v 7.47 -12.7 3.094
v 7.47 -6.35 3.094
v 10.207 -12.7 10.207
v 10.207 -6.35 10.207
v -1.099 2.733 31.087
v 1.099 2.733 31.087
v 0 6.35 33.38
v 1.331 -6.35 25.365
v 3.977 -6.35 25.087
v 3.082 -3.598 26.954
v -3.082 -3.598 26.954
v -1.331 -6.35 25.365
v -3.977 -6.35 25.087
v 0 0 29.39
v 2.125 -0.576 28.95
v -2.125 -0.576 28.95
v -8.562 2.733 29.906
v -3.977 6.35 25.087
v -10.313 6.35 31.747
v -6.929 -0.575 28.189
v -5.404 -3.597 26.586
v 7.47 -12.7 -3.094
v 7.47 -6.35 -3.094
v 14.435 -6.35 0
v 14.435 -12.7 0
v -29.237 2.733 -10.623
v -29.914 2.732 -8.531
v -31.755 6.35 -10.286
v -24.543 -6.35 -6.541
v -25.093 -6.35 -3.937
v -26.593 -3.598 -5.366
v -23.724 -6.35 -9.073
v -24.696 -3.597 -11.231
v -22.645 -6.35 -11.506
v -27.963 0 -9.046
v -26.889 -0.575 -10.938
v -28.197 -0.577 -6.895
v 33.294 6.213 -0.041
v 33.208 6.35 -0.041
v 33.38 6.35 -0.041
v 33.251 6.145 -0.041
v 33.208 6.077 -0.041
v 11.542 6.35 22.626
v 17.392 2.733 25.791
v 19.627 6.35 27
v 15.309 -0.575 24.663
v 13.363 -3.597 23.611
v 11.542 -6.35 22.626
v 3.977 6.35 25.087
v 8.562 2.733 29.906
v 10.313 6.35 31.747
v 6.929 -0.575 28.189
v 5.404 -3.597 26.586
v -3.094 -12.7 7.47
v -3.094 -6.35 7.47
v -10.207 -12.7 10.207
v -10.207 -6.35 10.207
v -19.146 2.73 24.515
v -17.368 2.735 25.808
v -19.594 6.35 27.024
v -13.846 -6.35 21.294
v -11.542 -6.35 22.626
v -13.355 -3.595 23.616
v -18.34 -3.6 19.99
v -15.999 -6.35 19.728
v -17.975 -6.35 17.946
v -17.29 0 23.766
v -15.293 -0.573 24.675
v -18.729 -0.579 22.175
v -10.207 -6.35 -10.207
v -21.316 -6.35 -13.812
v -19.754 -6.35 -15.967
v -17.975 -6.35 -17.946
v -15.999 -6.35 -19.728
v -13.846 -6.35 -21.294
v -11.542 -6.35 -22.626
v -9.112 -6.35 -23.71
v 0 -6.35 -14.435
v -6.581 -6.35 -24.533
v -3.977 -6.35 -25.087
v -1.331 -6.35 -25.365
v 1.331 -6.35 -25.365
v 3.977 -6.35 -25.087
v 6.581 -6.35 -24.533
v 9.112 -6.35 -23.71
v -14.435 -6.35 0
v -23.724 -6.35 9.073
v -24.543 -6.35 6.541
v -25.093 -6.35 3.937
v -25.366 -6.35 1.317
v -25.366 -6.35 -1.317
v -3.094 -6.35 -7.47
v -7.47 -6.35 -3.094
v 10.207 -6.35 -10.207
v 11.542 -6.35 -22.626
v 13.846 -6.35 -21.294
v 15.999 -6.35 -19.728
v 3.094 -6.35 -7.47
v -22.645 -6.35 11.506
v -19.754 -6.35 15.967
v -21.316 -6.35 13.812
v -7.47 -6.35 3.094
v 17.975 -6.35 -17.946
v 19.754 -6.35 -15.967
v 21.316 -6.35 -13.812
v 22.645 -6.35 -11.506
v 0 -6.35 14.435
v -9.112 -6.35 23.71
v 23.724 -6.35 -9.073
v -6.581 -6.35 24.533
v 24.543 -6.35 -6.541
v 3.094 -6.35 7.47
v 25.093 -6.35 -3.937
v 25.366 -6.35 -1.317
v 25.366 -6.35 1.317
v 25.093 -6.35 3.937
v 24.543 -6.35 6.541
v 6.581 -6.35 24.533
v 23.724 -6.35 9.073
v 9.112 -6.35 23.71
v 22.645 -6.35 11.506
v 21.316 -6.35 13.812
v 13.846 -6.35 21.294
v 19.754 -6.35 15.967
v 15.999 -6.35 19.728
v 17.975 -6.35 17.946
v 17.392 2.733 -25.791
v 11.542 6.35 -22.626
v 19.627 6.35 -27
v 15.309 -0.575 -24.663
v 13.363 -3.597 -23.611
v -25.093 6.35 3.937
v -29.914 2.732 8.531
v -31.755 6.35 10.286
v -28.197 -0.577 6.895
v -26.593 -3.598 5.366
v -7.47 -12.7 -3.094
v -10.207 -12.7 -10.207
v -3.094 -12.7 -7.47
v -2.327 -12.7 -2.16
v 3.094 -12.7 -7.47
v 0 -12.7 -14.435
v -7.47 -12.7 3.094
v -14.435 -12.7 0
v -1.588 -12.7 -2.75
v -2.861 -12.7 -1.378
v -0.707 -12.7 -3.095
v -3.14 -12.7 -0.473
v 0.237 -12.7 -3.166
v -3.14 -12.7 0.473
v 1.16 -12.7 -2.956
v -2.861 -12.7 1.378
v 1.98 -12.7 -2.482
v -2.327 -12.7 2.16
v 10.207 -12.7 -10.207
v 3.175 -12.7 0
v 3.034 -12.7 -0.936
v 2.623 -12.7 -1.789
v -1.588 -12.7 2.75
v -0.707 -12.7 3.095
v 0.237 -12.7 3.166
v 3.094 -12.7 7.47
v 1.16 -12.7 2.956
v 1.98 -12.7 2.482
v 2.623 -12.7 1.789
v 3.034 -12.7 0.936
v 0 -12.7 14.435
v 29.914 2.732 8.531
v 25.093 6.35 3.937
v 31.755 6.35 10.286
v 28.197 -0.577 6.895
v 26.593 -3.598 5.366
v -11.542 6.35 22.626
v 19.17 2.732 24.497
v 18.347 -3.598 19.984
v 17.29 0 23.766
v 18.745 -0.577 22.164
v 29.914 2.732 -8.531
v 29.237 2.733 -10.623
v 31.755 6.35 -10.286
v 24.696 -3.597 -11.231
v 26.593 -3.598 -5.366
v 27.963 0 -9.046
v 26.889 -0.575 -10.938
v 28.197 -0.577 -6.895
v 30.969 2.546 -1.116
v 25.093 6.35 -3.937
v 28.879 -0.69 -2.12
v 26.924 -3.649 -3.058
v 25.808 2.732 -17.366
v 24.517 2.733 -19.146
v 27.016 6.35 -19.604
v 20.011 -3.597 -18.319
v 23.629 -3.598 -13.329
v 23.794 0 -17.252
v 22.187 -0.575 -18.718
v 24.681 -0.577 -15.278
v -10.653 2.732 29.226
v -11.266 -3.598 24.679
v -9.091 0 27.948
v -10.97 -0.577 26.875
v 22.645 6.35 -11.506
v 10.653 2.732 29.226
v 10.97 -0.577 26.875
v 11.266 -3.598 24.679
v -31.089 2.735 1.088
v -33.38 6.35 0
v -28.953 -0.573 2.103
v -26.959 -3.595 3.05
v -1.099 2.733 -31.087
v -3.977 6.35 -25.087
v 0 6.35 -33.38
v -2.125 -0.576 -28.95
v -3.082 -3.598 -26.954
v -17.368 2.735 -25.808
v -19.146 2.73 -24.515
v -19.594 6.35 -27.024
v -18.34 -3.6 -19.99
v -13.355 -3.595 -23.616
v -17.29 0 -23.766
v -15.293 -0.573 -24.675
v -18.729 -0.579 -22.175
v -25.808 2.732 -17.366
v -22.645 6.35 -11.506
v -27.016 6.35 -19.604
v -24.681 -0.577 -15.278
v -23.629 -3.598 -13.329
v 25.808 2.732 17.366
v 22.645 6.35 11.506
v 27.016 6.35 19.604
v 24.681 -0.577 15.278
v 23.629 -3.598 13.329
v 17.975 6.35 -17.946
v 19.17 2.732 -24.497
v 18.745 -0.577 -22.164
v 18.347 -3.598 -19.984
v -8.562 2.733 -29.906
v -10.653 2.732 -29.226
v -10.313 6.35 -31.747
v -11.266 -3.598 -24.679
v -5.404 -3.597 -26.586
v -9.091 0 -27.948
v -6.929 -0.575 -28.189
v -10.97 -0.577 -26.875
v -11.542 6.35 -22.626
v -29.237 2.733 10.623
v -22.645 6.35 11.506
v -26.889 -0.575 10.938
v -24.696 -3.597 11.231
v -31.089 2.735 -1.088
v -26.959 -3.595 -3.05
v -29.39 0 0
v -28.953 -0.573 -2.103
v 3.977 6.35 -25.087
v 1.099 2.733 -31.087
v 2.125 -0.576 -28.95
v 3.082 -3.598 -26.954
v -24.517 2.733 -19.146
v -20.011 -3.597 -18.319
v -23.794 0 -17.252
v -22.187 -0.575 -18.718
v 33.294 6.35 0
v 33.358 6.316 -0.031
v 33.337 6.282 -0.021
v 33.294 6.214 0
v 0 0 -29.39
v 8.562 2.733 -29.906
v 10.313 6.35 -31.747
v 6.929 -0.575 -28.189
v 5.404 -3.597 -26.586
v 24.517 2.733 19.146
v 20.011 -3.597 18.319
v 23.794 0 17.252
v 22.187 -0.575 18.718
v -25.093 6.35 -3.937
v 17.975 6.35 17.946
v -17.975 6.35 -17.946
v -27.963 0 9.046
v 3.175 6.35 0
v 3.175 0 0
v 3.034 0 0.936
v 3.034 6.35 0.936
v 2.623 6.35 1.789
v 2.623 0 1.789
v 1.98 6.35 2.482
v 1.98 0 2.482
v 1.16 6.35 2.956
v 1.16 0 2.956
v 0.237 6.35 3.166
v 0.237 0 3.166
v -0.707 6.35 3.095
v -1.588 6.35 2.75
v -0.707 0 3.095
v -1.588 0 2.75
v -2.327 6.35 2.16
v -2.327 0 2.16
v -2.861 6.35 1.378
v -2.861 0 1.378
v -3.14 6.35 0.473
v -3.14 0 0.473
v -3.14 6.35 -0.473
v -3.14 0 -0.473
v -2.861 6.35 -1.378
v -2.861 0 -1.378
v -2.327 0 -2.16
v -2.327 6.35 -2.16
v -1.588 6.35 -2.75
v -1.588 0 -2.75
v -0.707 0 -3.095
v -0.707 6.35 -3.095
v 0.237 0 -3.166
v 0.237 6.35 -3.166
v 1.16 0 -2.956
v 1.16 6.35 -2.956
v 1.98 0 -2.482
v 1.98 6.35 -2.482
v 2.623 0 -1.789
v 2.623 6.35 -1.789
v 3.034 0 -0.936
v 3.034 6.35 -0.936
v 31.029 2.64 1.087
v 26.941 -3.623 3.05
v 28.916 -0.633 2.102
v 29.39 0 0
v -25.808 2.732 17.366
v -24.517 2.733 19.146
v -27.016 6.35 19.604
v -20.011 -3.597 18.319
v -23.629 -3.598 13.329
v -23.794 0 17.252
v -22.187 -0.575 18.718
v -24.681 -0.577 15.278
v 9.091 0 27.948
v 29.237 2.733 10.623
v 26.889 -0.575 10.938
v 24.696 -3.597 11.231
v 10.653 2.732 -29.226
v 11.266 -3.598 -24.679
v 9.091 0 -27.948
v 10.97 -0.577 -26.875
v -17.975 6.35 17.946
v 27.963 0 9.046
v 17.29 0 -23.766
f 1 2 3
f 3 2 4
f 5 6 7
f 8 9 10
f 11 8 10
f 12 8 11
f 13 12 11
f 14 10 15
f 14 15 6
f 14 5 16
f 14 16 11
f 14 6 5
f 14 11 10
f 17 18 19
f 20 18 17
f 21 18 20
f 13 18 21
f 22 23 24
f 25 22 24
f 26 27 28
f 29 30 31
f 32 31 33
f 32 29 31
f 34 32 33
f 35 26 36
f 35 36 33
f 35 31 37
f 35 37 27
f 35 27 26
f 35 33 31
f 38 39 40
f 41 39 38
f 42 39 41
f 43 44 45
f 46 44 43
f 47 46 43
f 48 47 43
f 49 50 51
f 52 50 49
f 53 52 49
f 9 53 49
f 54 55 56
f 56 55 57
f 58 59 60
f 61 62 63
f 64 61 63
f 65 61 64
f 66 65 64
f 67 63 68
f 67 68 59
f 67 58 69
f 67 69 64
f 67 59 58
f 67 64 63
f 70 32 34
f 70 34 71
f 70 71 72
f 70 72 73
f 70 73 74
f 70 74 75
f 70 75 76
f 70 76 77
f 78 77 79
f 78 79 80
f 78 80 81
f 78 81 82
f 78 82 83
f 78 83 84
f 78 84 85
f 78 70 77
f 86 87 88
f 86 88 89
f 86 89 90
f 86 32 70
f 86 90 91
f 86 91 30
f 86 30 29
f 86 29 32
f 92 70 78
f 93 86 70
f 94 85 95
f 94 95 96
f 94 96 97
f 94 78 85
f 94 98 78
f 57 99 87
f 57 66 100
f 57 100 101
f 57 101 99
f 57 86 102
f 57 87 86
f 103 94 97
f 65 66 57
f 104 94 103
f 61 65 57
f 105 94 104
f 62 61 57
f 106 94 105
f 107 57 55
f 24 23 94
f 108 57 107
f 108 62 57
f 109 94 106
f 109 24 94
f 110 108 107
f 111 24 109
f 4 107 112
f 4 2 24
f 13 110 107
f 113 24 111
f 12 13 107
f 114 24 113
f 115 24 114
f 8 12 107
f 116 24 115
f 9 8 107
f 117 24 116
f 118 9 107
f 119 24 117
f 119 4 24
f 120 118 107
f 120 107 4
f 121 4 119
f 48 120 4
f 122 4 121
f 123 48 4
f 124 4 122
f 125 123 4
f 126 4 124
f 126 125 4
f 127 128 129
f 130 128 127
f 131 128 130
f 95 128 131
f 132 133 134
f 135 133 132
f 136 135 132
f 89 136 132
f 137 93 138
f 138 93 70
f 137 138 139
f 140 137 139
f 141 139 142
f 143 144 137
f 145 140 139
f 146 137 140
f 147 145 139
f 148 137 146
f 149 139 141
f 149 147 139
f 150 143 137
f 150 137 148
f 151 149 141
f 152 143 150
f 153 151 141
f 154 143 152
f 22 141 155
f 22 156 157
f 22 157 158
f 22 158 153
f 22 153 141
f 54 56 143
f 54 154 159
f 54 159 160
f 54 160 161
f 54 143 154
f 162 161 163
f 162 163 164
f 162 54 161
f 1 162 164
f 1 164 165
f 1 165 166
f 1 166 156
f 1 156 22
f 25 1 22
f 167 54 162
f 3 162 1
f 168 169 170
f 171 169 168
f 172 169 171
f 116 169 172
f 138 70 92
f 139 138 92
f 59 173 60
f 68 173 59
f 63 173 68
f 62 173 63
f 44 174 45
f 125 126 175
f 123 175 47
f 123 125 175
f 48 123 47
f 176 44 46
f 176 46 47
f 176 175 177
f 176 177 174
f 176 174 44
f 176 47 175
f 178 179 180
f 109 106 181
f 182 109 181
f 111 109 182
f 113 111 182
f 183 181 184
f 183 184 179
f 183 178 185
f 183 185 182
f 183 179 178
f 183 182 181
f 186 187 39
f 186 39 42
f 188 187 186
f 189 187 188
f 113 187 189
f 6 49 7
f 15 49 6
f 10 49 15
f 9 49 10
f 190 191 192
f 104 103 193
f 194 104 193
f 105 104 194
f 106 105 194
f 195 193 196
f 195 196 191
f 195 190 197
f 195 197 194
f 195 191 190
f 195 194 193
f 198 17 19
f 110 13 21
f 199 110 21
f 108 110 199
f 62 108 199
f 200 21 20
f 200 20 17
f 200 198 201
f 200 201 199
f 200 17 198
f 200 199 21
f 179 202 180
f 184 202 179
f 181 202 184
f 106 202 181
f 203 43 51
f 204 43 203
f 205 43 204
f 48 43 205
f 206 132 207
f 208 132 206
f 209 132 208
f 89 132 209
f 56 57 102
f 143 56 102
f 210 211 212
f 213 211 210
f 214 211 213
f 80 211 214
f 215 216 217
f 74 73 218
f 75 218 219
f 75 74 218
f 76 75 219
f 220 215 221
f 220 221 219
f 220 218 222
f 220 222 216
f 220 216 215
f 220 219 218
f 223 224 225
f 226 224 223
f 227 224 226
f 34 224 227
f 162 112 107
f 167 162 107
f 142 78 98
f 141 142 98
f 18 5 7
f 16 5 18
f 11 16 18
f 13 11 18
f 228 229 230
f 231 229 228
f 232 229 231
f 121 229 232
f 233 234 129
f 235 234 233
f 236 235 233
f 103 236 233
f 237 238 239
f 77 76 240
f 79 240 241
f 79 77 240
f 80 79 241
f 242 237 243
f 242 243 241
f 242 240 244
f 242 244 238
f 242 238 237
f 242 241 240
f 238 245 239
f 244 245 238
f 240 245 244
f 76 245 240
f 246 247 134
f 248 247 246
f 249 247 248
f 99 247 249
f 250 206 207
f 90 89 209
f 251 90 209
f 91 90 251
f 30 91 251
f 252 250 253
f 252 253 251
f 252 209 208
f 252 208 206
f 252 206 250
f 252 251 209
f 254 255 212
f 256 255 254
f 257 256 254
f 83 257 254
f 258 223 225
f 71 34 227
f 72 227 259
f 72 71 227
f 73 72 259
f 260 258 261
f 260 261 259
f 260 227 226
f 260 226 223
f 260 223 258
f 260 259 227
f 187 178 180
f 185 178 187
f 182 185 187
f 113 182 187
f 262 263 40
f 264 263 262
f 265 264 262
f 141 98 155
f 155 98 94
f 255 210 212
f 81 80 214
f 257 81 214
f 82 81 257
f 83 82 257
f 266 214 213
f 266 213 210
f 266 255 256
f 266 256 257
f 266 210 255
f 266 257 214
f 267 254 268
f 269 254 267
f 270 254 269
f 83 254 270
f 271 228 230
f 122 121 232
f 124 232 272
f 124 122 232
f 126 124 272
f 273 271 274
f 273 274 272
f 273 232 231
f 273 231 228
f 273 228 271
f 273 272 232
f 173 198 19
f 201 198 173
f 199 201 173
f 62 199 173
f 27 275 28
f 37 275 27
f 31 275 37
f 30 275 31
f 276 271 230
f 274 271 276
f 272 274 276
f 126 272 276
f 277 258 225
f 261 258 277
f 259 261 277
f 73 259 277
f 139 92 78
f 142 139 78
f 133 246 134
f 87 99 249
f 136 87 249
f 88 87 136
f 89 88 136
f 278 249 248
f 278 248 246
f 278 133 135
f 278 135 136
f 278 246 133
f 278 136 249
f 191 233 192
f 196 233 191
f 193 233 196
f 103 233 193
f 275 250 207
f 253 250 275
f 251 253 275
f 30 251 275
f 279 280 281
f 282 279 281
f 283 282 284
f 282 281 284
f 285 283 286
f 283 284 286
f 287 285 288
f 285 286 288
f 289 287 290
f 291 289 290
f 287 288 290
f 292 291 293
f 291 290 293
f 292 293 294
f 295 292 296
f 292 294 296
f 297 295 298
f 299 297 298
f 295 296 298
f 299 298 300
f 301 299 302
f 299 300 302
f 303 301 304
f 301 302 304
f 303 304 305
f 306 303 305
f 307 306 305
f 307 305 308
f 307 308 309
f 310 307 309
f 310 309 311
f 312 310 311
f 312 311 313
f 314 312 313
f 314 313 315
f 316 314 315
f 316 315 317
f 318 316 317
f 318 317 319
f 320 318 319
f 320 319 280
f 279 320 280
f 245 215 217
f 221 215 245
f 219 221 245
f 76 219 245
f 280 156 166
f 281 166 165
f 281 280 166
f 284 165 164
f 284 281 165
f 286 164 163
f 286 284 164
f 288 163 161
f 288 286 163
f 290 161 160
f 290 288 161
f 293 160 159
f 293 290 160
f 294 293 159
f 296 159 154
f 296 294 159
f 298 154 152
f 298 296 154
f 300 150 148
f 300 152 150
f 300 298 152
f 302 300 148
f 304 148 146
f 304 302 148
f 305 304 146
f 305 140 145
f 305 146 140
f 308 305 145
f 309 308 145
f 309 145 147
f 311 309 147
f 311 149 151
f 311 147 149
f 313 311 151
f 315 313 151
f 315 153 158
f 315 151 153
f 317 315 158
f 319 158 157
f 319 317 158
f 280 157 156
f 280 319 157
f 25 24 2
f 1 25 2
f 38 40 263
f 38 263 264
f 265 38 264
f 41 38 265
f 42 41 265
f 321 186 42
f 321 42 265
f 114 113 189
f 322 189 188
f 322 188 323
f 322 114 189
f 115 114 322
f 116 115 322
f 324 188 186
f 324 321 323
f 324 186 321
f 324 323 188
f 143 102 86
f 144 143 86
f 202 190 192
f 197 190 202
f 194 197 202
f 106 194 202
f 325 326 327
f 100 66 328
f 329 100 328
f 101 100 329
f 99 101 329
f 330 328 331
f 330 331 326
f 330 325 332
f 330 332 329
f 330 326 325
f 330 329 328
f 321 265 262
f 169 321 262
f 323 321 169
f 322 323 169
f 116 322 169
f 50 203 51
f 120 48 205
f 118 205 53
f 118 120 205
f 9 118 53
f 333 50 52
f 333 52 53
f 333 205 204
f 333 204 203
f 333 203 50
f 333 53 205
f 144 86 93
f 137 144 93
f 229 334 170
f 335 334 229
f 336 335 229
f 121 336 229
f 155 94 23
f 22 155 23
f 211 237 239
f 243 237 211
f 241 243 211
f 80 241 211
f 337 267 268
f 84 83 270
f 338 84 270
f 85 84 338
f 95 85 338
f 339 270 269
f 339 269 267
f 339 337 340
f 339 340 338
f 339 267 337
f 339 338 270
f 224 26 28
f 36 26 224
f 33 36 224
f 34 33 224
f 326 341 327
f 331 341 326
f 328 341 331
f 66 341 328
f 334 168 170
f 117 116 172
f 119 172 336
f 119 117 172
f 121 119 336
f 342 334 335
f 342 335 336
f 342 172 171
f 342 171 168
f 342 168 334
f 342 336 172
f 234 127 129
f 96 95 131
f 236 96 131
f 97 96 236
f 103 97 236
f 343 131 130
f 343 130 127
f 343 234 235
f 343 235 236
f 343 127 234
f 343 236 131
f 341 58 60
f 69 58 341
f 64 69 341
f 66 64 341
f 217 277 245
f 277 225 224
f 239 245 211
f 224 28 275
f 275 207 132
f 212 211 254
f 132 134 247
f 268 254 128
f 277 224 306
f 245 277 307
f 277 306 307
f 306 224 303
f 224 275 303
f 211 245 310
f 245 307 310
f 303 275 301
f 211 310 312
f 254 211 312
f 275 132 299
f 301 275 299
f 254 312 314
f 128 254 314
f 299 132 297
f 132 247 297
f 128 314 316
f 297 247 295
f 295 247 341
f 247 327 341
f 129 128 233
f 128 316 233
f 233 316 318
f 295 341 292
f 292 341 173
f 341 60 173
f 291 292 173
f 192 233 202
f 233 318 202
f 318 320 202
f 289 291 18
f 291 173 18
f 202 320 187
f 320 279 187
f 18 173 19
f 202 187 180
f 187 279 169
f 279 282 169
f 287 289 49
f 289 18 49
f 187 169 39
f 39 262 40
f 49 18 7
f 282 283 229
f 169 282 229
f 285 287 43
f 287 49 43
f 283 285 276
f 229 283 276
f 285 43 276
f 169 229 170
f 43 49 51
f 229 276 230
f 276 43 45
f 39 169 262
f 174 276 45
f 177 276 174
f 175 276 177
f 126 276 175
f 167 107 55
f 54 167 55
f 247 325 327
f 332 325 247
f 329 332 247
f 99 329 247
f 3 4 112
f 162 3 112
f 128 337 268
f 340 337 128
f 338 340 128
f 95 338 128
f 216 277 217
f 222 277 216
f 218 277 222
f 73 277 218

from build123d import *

# Parameters (mm, degrees)
F1_DEPTH = 6.35
F6_DEPTH = 6.35
F5_R     = 3.175
F7_DEPTH = 63.5


with BuildPart() as f1:
    # F0 (on Front) → F1 (new body, symmetric)
    with BuildSketch(Plane.XZ):
        with BuildLine():
            ThreePointArc((25.3999666944, -0.0411329817), (25.3999916736, -0.0205664976), (25.4, 0))
            ThreePointArc((25.4, 0), (25.3231458192, 1.9744077138), (25.0930483606, 3.9368672789))
            ThreePointArc((25.0930483606, 3.9368672789), (24.706334539, 5.8955096173), (24.1669838755, 7.8177292331))
            Line((24.1669838755, 7.8177292331), (0.0326778328, -0.0326249568))
            Line((0.0326778328, -0.0326249568), (0.0299255888, -0.0411329817))
            Line((0.0299255888, -0.0411329817), (25.3999666944, -0.0411329817))
        make_face()
        with BuildLine():
            ThreePointArc((25.0930483606, 3.9368672789), (25.3231458192, 1.9744077138), (25.4, 0))
            ThreePointArc((25.4, 0), (25.3999916736, -0.0205664976), (25.3999666944, -0.0411329817))
            Line((25.3999666944, -0.0411329817), (33.2082439851, -0.0411329817))
            Line((33.2082439851, -0.0411329817), (33.2939280097, 0))
            Line((33.2939280097, 0), (25.0930483606, 3.9368672789))
        make_face()
        with BuildLine():
            ThreePointArc((24.1669838755, 7.8177292331), (24.706334539, 5.8955096173), (25.0930483606, 3.9368672789))
            Line((25.0930483606, 3.9368672789), (31.7552785313, 10.2860330974))
            Line((31.7552785313, 10.2860330974), (24.1669838755, 7.8177292331))
        make_face()
        with BuildLine():
            Line((33.2082439851, -0.0411329817), (25.3999666944, -0.0411329817))
            ThreePointArc((25.3999666944, -0.0411329817), (25.3215388309, -1.994911335), (25.0930483606, -3.9368672789))
            Line((25.0930483606, -3.9368672789), (33.2082439851, -0.0411329817))
        make_face()
        with BuildLine():
            ThreePointArc((25.0930483606, -3.9368672789), (25.3215388309, -1.994911335), (25.3999666944, -0.0411329817))
            Line((25.3999666944, -0.0411329817), (0.0299255888, -0.0411329817))
            Line((0.0299255888, -0.0411329817), (0.0264556072, -0.0518597526))
            Line((0.0264556072, -0.0518597526), (24.1415369557, -7.895960576))
            ThreePointArc((24.1415369557, -7.895960576), (24.6967549032, -5.9355115407), (25.0930483606, -3.9368672789))
        make_face()
        with BuildLine():
            Line((0.0326778328, -0.0326249568), (24.1669838755, 7.8177292331))
            ThreePointArc((24.1669838755, 7.8177292331), (23.4783285027, 9.6916505673), (22.6446229644, 11.5056964501))
            ThreePointArc((22.6446229644, 11.5056964501), (21.6710179307, 13.2486596246), (20.5635283771, 14.9097719863))
            Line((20.5635283771, 14.9097719863), (0.0350181754, -0.0253902444))
            Line((0.0350181754, -0.0253902444), (0.0326778328, -0.0326249568))
        make_face()
        with BuildLine():
            ThreePointArc((22.6446229644, 11.5056964501), (23.4783285027, 9.6916505673), (24.1669838755, 7.8177292331))
            Line((24.1669838755, 7.8177292331), (31.7552785313, 10.2860330974))
            Line((31.7552785313, 10.2860330974), (22.6446229644, 11.5056964501))
        make_face()
        Polygon((33.3796120343, -0.0411329817), (33.2939280097, 0), (33.2082439851, -0.0411329817), align=None)
        with BuildLine():
            Line((31.7552785313, -10.2860330974), (25.0930483606, -3.9368672789))
            ThreePointArc((25.0930483606, -3.9368672789), (24.6967549032, -5.9355115407), (24.1415369557, -7.895960576))
            ThreePointArc((24.1415369557, -7.895960576), (23.4626029734, -9.7296588694), (22.6446229644, -11.5056964501))
            Line((22.6446229644, -11.5056964501), (31.7552785313, -10.2860330974))
        make_face()
        with BuildLine():
            ThreePointArc((20.5635283771, 14.9097719863), (21.6710179307, 13.2486596246), (22.6446229644, 11.5056964501))
            Line((22.6446229644, 11.5056964501), (27.0161574965, 19.6042705962))
            Line((27.0161574965, 19.6042705962), (20.5635283771, 14.9097719863))
        make_face()
        with BuildLine():
            ThreePointArc((22.6446229644, -11.5056964501), (23.4626029734, -9.7296588694), (24.1415369557, -7.895960576))
            Line((24.1415369557, -7.895960576), (0.0264556072, -0.0518597526))
            Line((0.0264556072, -0.0518597526), (0.0216754409, -0.0666367035))
            Line((0.0216754409, -0.0666367035), (20.5151305555, -14.9762952125))
            ThreePointArc((20.5151305555, -14.9762952125), (21.6495345196, -13.283736488), (22.6446229644, -11.5056964501))
        make_face()
        with BuildLine():
            Line((0.0350181754, -0.0253902444), (20.5635283771, 14.9097719863))
            ThreePointArc((20.5635283771, 14.9097719863), (19.3289964238, 16.4787711086), (17.9750490644, 17.9459636446))
            ThreePointArc((17.9750490644, 17.9459636446), (16.5100510465, 19.302285213), (14.9430531934, 20.5393563984))
            Line((14.9430531934, 20.5393563984), (0.0371289603, -0.0188651649))
            Line((0.0371289603, -0.0188651649), (0.0350181754, -0.0253902444))
        make_face()
        with BuildLine():
            ThreePointArc((17.9750490644, 17.9459636446), (19.3289964238, 16.4787711086), (20.5635283771, 14.9097719863))
            Line((20.5635283771, 14.9097719863), (27.0161574965, 19.6042705962))
            Line((27.0161574965, 19.6042705962), (17.9750490644, 17.9459636446))
        make_face()
        with BuildLine():
            Line((27.0161574965, -19.6042705962), (22.6446229644, -11.5056964501))
            ThreePointArc((22.6446229644, -11.5056964501), (21.6495345196, -13.283736488), (20.5151305555, -14.9762952125))
            ThreePointArc((20.5151305555, -14.9762952125), (19.302285213, -16.5100510465), (17.9750490644, -17.9459636446))
            Line((17.9750490644, -17.9459636446), (27.0161574965, -19.6042705962))
        make_face()
        with BuildLine():
            Line((20.5151305555, -14.9762952125), (0.0216754409, -0.0666367035))
            Line((0.0216754409, -0.0666367035), (0.0142195958, -0.0896849932))
            Line((0.0142195958, -0.0896849932), (14.8764516786, -20.5876464282))
            ThreePointArc((14.8764516786, -20.5876464282), (16.4787711086, -19.3289964238), (17.9750490644, -17.9459636446))
            ThreePointArc((17.9750490644, -17.9459636446), (19.302285213, -16.5100510465), (20.5151305555, -14.9762952125))
        make_face()
        with BuildLine():
            ThreePointArc((14.9430531934, 20.5393563984), (16.5100510465, 19.302285213), (17.9750490644, 17.9459636446))
            Line((17.9750490644, 17.9459636446), (19.6270962066, 26.9995793667))
            Line((19.6270962066, 26.9995793667), (14.9430531934, 20.5393563984))
        make_face()
        with BuildLine():
            Line((0.0294725544, -0.0294248649), (0.0371289603, -0.0188651649))
            Line((0.0371289603, -0.0188651649), (7.8568552068, 24.1542920877))
            ThreePointArc((7.8568552068, 24.1542920877), (5.9355115407, 24.6967549032), (3.9774980183, 25.0866400603))
            ThreePointArc((3.9774980183, 25.0866400603), (1.994911335, 25.3215388309), (0, 25.4))
            Line((0, 25.4), (-0.041143489, -0.006455033))
            Line((-0.041143489, -0.006455033), (-0.0371289603, -0.0188651649))
            Line((-0.0371289603, -0.0188651649), (-0.0294725544, -0.0294248649))
            Line((-0.0294725544, -0.0294248649), (-0.0189252671, -0.0370983612))
            Line((-0.0189252671, -0.0370983612), (-0.0065216527, -0.0411329817))
            Line((-0.0065216527, -0.0411329817), (0.0065216527, -0.0411329817))
            Line((0.0065216527, -0.0411329817), (0.0189252671, -0.0370983612))
            Line((0.0189252671, -0.0370983612), (0.0294725544, -0.0294248649))
        make_face()
        with BuildLine():
            Line((7.8568552068, 24.1542920877), (0.0371289603, -0.0188651649))
            Line((0.0371289603, -0.0188651649), (14.9430531934, 20.5393563984))
            ThreePointArc((14.9430531934, 20.5393563984), (13.283736488, 21.6495345196), (11.5423522634, 22.6259608465))
            ThreePointArc((11.5423522634, 22.6259608465), (9.7296588694, 23.4626029734), (7.8568552068, 24.1542920877))
        make_face()
        with BuildLine():
            Line((14.8764516786, -20.5876464282), (0.0142195958, -0.0896849932))
            Line((0.0142195958, -0.0896849932), (0, -0.133642098))
            Line((0, -0.133642098), (7.7785827575, -24.1796122857))
            ThreePointArc((7.7785827575, -24.1796122857), (9.6916505673, -23.4783285027), (11.5423522634, -22.6259608465))
            ThreePointArc((11.5423522634, -22.6259608465), (13.2486596246, -21.6710179307), (14.8764516786, -20.5876464282))
        make_face()
        with BuildLine():
            ThreePointArc((11.5423522634, 22.6259608465), (13.283736488, 21.6495345196), (14.9430531934, 20.5393563984))
            Line((14.9430531934, 20.5393563984), (19.6270962066, 26.9995793667))
            Line((19.6270962066, 26.9995793667), (11.5423522634, 22.6259608465))
        make_face()
        with BuildLine():
            Line((10.3128672742, 31.7465739895), (7.8568552068, 24.1542920877))
            ThreePointArc((7.8568552068, 24.1542920877), (9.7296588694, 23.4626029734), (11.5423522634, 22.6259608465))
            Line((11.5423522634, 22.6259608465), (10.3128672742, 31.7465739895))
        make_face()
        with BuildLine():
            ThreePointArc((3.9774980183, 25.0866400603), (5.9355115407, 24.6967549032), (7.8568552068, 24.1542920877))
            Line((7.8568552068, 24.1542920877), (10.3128672742, 31.7465739895))
            Line((10.3128672742, 31.7465739895), (3.9774980183, 25.0866400603))
        make_face()
        with BuildLine():
            Line((19.6270962066, -26.9995793667), (17.9750490644, -17.9459636446))
            ThreePointArc((17.9750490644, -17.9459636446), (16.4787711086, -19.3289964238), (14.8764516786, -20.5876464282))
            ThreePointArc((14.8764516786, -20.5876464282), (13.2486596246, -21.6710179307), (11.5423522634, -22.6259608465))
            Line((11.5423522634, -22.6259608465), (19.6270962066, -26.9995793667))
        make_face()
        with BuildLine():
            Line((7.7785827575, -24.1796122857), (0, -0.133642098))
            Line((0, -0.133642098), (-0.0415574978, -0.2621089903))
            Line((-0.0415574978, -0.2621089903), (-0.0822658556, -25.3998667778))
            ThreePointArc((-0.0822658556, -25.3998667778), (1.9539027981, -25.3247362051), (3.9774980183, -25.0866400603))
            ThreePointArc((3.9774980183, -25.0866400603), (5.8955096173, -24.706334539), (7.7785827575, -24.1796122857))
        make_face()
        with BuildLine():
            ThreePointArc((0, 25.4), (1.994911335, 25.3215388309), (3.9774980183, 25.0866400603))
            Line((3.9774980183, 25.0866400603), (0, 33.3796453399))
            Line((0, 33.3796453399), (0, 25.4))
        make_face()
        with BuildLine():
            Line((-7.7785827575, -24.1796122857), (-0.0415574978, -0.2621089903))
            Line((-0.0415574978, -0.2621089903), (-0.041338843, -0.1270878059))
            Line((-0.041338843, -0.1270878059), (-14.8764516786, -20.5876464282))
            ThreePointArc((-14.8764516786, -20.5876464282), (-13.2486596246, -21.6710179307), (-11.5423522634, -22.6259608465))
            ThreePointArc((-11.5423522634, -22.6259608465), (-9.6916505673, -23.4783285027), (-7.7785827575, -24.1796122857))
        make_face()
        with BuildLine():
            Line((-0.0822658556, -25.3998667778), (-0.0415574978, -0.2621089903))
            Line((-0.0415574978, -0.2621089903), (-7.7785827575, -24.1796122857))
            ThreePointArc((-7.7785827575, -24.1796122857), (-5.8955096173, -24.706334539), (-3.9774980183, -25.0866400603))
            ThreePointArc((-3.9774980183, -25.0866400603), (-2.0359146402, -25.3182750514), (-0.0822658556, -25.3998667778))
        make_face()
        with BuildLine():
            ThreePointArc((11.5423522634, -22.6259608465), (9.6916505673, -23.4783285027), (7.7785827575, -24.1796122857))
            ThreePointArc((7.7785827575, -24.1796122857), (5.8955096173, -24.706334539), (3.9774980183, -25.0866400603))
            Line((3.9774980183, -25.0866400603), (10.3128672742, -31.7465739895))
            Line((10.3128672742, -31.7465739895), (11.5423522634, -22.6259608465))
        make_face()
        with BuildLine():
            Line((-0.041143489, -0.006455033), (0, 25.4))
            ThreePointArc((0, 25.4), (-1.994911335, 25.3215388309), (-3.9774980183, 25.0866400603))
            ThreePointArc((-3.9774980183, 25.0866400603), (-5.9355115407, 24.6967549032), (-7.8568552068, 24.1542920877))
            Line((-7.8568552068, 24.1542920877), (-0.041143489, -0.006455033))
        make_face()
        with BuildLine():
            ThreePointArc((-3.9774980183, 25.0866400603), (-1.994911335, 25.3215388309), (0, 25.4))
            Line((0, 25.4), (0, 33.3796453399))
            Line((0, 33.3796453399), (-3.9774980183, 25.0866400603))
        make_face()
        with BuildLine():
            Line((-14.8764516786, -20.5876464282), (-0.041338843, -0.1270878059))
            Line((-0.041338843, -0.1270878059), (-0.0412640266, -0.08088804))
            Line((-0.0412640266, -0.08088804), (-20.5151305555, -14.9762952125))
            ThreePointArc((-20.5151305555, -14.9762952125), (-19.302285213, -16.5100510465), (-17.9750490644, -17.9459636446))
            ThreePointArc((-17.9750490644, -17.9459636446), (-16.4787711086, -19.3289964238), (-14.8764516786, -20.5876464282))
        make_face()
        with BuildLine():
            ThreePointArc((3.9774980183, -25.0866400603), (1.9539027981, -25.3247362051), (-0.0822658556, -25.3998667778))
            ThreePointArc((-0.0822658556, -25.3998667778), (-2.0359146402, -25.3182750514), (-3.9774980183, -25.0866400603))
            Line((-3.9774980183, -25.0866400603), (0, -33.3796453399))
            Line((0, -33.3796453399), (3.9774980183, -25.0866400603))
        make_face()
        with BuildLine():
            ThreePointArc((-3.9774980183, -25.0866400603), (-5.8955096173, -24.706334539), (-7.7785827575, -24.1796122857))
            ThreePointArc((-7.7785827575, -24.1796122857), (-9.6916505673, -23.4783285027), (-11.5423522634, -22.6259608465))
            Line((-11.5423522634, -22.6259608465), (-10.3128672794, -31.7465739878))
            Line((-10.3128672794, -31.7465739878), (-3.9774980183, -25.0866400603))
        make_face()
        with BuildLine():
            ThreePointArc((-7.8568552068, 24.1542920877), (-5.9355115407, 24.6967549032), (-3.9774980183, 25.0866400603))
            Line((-3.9774980183, 25.0866400603), (-10.3128672794, 31.7465739878))
            Line((-10.3128672794, 31.7465739878), (-7.8568552068, 24.1542920877))
        make_face()
        with BuildLine():
            Line((-0.0411545949, -0.0133130175), (-0.041143489, -0.006455033))
            Line((-0.041143489, -0.006455033), (-7.8568552068, 24.1542920877))
            ThreePointArc((-7.8568552068, 24.1542920877), (-9.7296588694, 23.4626029734), (-11.5423522634, 22.6259608465))
            ThreePointArc((-11.5423522634, 22.6259608465), (-13.283736488, 21.6495345196), (-14.9430531934, 20.5393563984))
            Line((-14.9430531934, 20.5393563984), (-0.0411545949, -0.0133130175))
        make_face()
        with BuildLine():
            Line((-20.5151305555, -14.9762952125), (-0.0412640266, -0.08088804))
            Line((-0.0412640266, -0.08088804), (-0.0412247977, -0.0566638425))
            Line((-0.0412247977, -0.0566638425), (-24.1415369557, -7.895960576))
            ThreePointArc((-24.1415369557, -7.895960576), (-23.4626029734, -9.7296588694), (-22.6446229644, -11.5056964501))
            ThreePointArc((-22.6446229644, -11.5056964501), (-21.6495345196, -13.283736488), (-20.5151305555, -14.9762952125))
        make_face()
        with BuildLine():
            ThreePointArc((-11.5423522634, -22.6259608465), (-13.2486596246, -21.6710179307), (-14.8764516786, -20.5876464282))
            ThreePointArc((-14.8764516786, -20.5876464282), (-16.4787711086, -19.3289964238), (-17.9750490644, -17.9459636446))
            Line((-17.9750490644, -17.9459636446), (-19.5937332182, -27.0236385527))
            Line((-19.5937332182, -27.0236385527), (-11.5423522634, -22.6259608465))
        make_face()
        with BuildLine():
            ThreePointArc((-11.5423522634, 22.6259608465), (-9.7296588694, 23.4626029734), (-7.8568552068, 24.1542920877))
            Line((-7.8568552068, 24.1542920877), (-10.3128672794, 31.7465739878))
            Line((-10.3128672794, 31.7465739878), (-11.5423522634, 22.6259608465))
        make_face()
        with BuildLine():
            Line((-0.0411669086, -0.02091684), (-0.0411545949, -0.0133130175))
            Line((-0.0411545949, -0.0133130175), (-14.9430531934, 20.5393563984))
            ThreePointArc((-14.9430531934, 20.5393563984), (-16.5100510465, 19.302285213), (-17.9750490644, 17.9459636446))
            ThreePointArc((-17.9750490644, 17.9459636446), (-19.3289964238, 16.4787711086), (-20.5635283771, 14.9097719863))
            Line((-20.5635283771, 14.9097719863), (-0.0411669086, -0.02091684))
        make_face()
        with BuildLine():
            Line((-24.1415369557, -7.895960576), (-0.0412247977, -0.0566638425))
            Line((-0.0412247977, -0.0566638425), (-0.0411996469, -0.0411329817))
            Line((-0.0411996469, -0.0411329817), (-25.3999666944, -0.0411329817))
            ThreePointArc((-25.3999666944, -0.0411329817), (-25.3215388309, -1.994911335), (-25.0930483606, -3.9368672789))
            ThreePointArc((-25.0930483606, -3.9368672789), (-24.6967549032, -5.9355115407), (-24.1415369557, -7.895960576))
        make_face()
        with BuildLine():
            ThreePointArc((-17.9750490644, -17.9459636446), (-19.302285213, -16.5100510465), (-20.5151305555, -14.9762952125))
            ThreePointArc((-20.5151305555, -14.9762952125), (-21.6495345196, -13.283736488), (-22.6446229644, -11.5056964501))
            Line((-22.6446229644, -11.5056964501), (-27.0161574965, -19.6042705962))
            Line((-27.0161574965, -19.6042705962), (-17.9750490644, -17.9459636446))
        make_face()
        with BuildLine():
            Line((-25.3999666944, -0.0411329817), (-0.0411996469, -0.0411329817))
            Line((-0.0411996469, -0.0411329817), (-0.0411813896, -0.0298589385))
            Line((-0.0411813896, -0.0298589385), (-24.1669838755, 7.8177292331))
            ThreePointArc((-24.1669838755, 7.8177292331), (-24.706334539, 5.8955096173), (-25.0930483606, 3.9368672789))
            ThreePointArc((-25.0930483606, 3.9368672789), (-25.3247362051, 1.9539027981), (-25.3999666944, -0.0411329817))
        make_face()
        with BuildLine():
            Line((-24.1669838755, 7.8177292331), (-0.0411813896, -0.0298589385))
            Line((-0.0411813896, -0.0298589385), (-0.0411669086, -0.02091684))
            Line((-0.0411669086, -0.02091684), (-20.5635283771, 14.9097719863))
            ThreePointArc((-20.5635283771, 14.9097719863), (-21.6710179307, 13.2486596246), (-22.6446229644, 11.5056964501))
            ThreePointArc((-22.6446229644, 11.5056964501), (-23.4783285027, 9.6916505673), (-24.1669838755, 7.8177292331))
        make_face()
        with BuildLine():
            ThreePointArc((-14.9430531934, 20.5393563984), (-13.283736488, 21.6495345196), (-11.5423522634, 22.6259608465))
            Line((-11.5423522634, 22.6259608465), (-19.5937332182, 27.0236385527))
            Line((-19.5937332182, 27.0236385527), (-14.9430531934, 20.5393563984))
        make_face()
        with BuildLine():
            ThreePointArc((-17.9750490644, 17.9459636446), (-16.5100510465, 19.302285213), (-14.9430531934, 20.5393563984))
            Line((-14.9430531934, 20.5393563984), (-19.5937332182, 27.0236385527))
            Line((-19.5937332182, 27.0236385527), (-17.9750490644, 17.9459636446))
        make_face()
        with BuildLine():
            ThreePointArc((-22.6446229644, -11.5056964501), (-23.4626029734, -9.7296588694), (-24.1415369557, -7.895960576))
            ThreePointArc((-24.1415369557, -7.895960576), (-24.6967549032, -5.9355115407), (-25.0930483606, -3.9368672789))
            Line((-25.0930483606, -3.9368672789), (-31.7552785313, -10.2860330974))
            Line((-31.7552785313, -10.2860330974), (-22.6446229644, -11.5056964501))
        make_face()
        with BuildLine():
            Line((-33.3795060187, 0), (-25.3999666944, -0.0411329817))
            ThreePointArc((-25.3999666944, -0.0411329817), (-25.3247362051, 1.9539027981), (-25.0930483606, 3.9368672789))
            Line((-25.0930483606, 3.9368672789), (-33.3795060187, 0))
        make_face()
        with BuildLine():
            ThreePointArc((-25.0930483606, -3.9368672789), (-25.3215388309, -1.994911335), (-25.3999666944, -0.0411329817))
            Line((-25.3999666944, -0.0411329817), (-33.3795060187, 0))
            Line((-33.3795060187, 0), (-25.0930483606, -3.9368672789))
        make_face()
        with BuildLine():
            Line((-31.7552785313, 10.2860330974), (-24.1669838755, 7.8177292331))
            ThreePointArc((-24.1669838755, 7.8177292331), (-23.4783285027, 9.6916505673), (-22.6446229644, 11.5056964501))
            Line((-22.6446229644, 11.5056964501), (-31.7552785313, 10.2860330974))
        make_face()
        with BuildLine():
            ThreePointArc((-25.0930483606, 3.9368672789), (-24.706334539, 5.8955096173), (-24.1669838755, 7.8177292331))
            Line((-24.1669838755, 7.8177292331), (-31.7552785313, 10.2860330974))
            Line((-31.7552785313, 10.2860330974), (-25.0930483606, 3.9368672789))
        make_face()
        with BuildLine():
            Line((-27.0161574965, 19.6042705962), (-20.5635283771, 14.9097719863))
            ThreePointArc((-20.5635283771, 14.9097719863), (-19.3289964238, 16.4787711086), (-17.9750490644, 17.9459636446))
            Line((-17.9750490644, 17.9459636446), (-27.0161574965, 19.6042705962))
        make_face()
        with BuildLine():
            ThreePointArc((-22.6446229644, 11.5056964501), (-21.6710179307, 13.2486596246), (-20.5635283771, 14.9097719863))
            Line((-20.5635283771, 14.9097719863), (-27.0161574965, 19.6042705962))
            Line((-27.0161574965, 19.6042705962), (-22.6446229644, 11.5056964501))
        make_face()
    extrude(amount=F1_DEPTH, both=True)

    # F2 (on Right) → F3 (revolve, cut)
    with BuildSketch(Plane.YZ):
        Polygon((-6.35, -33.3796453399), (0, -33.3796453399), (6.35, -33.3796453399), (-6.35, -25.4), align=None)
    revolve(axis=Axis((0, -3.175, 0), (0, -1, 0)), mode=Mode.SUBTRACT)

    # F4 (on face) → F6 (join)
    with BuildSketch(Plane.XZ.offset(6.35)):
        with BuildLine():
            Line((0, 0), (8.085071109, 0))
            ThreePointArc((8.085071109, 0), (7.9297187347, 1.5773191262), (7.4696317165, 3.0940227629))
            Line((7.4696317165, 3.0940227629), (0, 0))
        make_face()
        with BuildLine():
            Line((14.435071109, 0), (8.085071109, 0))
            ThreePointArc((8.085071109, 0), (7.9297187347, -1.5773191262), (7.4696317165, -3.0940227629))
            Line((7.4696317165, -3.0940227629), (14.435071109, 0))
        make_face()
        with BuildLine():
            ThreePointArc((7.4696317165, -3.0940227629), (7.9297187347, -1.5773191262), (8.085071109, 0))
            Line((8.085071109, 0), (0, 0))
            Line((0, 0), (7.4696317165, -3.0940227629))
        make_face()
        with BuildLine():
            ThreePointArc((7.4696317165, 3.0940227629), (7.9297187347, 1.5773191262), (8.085071109, 0))
            Line((8.085071109, 0), (14.435071109, 0))
            Line((14.435071109, 0), (7.4696317165, 3.0940227629))
        make_face()
        with BuildLine():
            Line((0, 0), (7.4696317165, 3.0940227629))
            ThreePointArc((7.4696317165, 3.0940227629), (6.7224909404, 4.49182484), (5.7170086075, 5.7170086075))
            Line((5.7170086075, 5.7170086075), (0, 0))
        make_face()
        with BuildLine():
            ThreePointArc((5.7170086075, 5.7170086075), (6.7224909404, 4.49182484), (7.4696317165, 3.0940227629))
            Line((7.4696317165, 3.0940227629), (10.2071366681, 10.2071366681))
            Line((10.2071366681, 10.2071366681), (5.7170086075, 5.7170086075))
        make_face()
        with BuildLine():
            Line((10.2071366681, -10.2071366681), (7.4696317165, -3.0940227629))
            ThreePointArc((7.4696317165, -3.0940227629), (6.7224909404, -4.49182484), (5.7170086075, -5.7170086075))
            Line((5.7170086075, -5.7170086075), (10.2071366681, -10.2071366681))
        make_face()
        with BuildLine():
            ThreePointArc((5.7170086075, -5.7170086075), (6.7224909404, -4.49182484), (7.4696317165, -3.0940227629))
            Line((7.4696317165, -3.0940227629), (0, 0))
            Line((0, 0), (5.7170086075, -5.7170086075))
        make_face()
        with BuildLine():
            Line((-3.0940227629, 7.4696317165), (0, 0))
            Line((0, 0), (3.0940227629, 7.4696317165))
            ThreePointArc((3.0940227629, 7.4696317165), (1.5773191262, 7.9297187347), (0, 8.085071109))
            ThreePointArc((0, 8.085071109), (-1.5773191262, 7.9297187347), (-3.0940227629, 7.4696317165))
        make_face()
        with BuildLine():
            Line((3.0940227629, 7.4696317165), (0, 0))
            Line((0, 0), (5.7170086075, 5.7170086075))
            ThreePointArc((5.7170086075, 5.7170086075), (4.49182484, 6.7224909404), (3.0940227629, 7.4696317165))
        make_face()
        with BuildLine():
            Line((5.7170086075, -5.7170086075), (0, 0))
            Line((0, 0), (3.0940227629, -7.4696317165))
            ThreePointArc((3.0940227629, -7.4696317165), (4.49182484, -6.7224909404), (5.7170086075, -5.7170086075))
        make_face()
        with BuildLine():
            Line((3.0940227629, -7.4696317165), (0, 0))
            Line((0, 0), (-3.0940227629, -7.4696317165))
            ThreePointArc((-3.0940227629, -7.4696317165), (-1.5773191262, -7.9297187347), (0, -8.085071109))
            ThreePointArc((0, -8.085071109), (1.5773191262, -7.9297187347), (3.0940227629, -7.4696317165))
        make_face()
        with BuildLine():
            Line((-3.0940227629, -7.4696317165), (0, 0))
            Line((0, 0), (-5.7170086075, -5.7170086075))
            ThreePointArc((-5.7170086075, -5.7170086075), (-4.49182484, -6.7224909404), (-3.0940227629, -7.4696317165))
        make_face()
        with BuildLine():
            Line((-5.7170086075, -5.7170086075), (0, 0))
            Line((0, 0), (-7.4696317165, -3.0940227629))
            ThreePointArc((-7.4696317165, -3.0940227629), (-6.7224909404, -4.49182484), (-5.7170086075, -5.7170086075))
        make_face()
        with BuildLine():
            Line((-7.4696317165, -3.0940227629), (0, 0))
            Line((0, 0), (-7.4696317165, 3.0940227629))
            ThreePointArc((-7.4696317165, 3.0940227629), (-7.9297187347, 1.5773191262), (-8.085071109, 0))
            ThreePointArc((-8.085071109, 0), (-7.9297187347, -1.5773191262), (-7.4696317165, -3.0940227629))
        make_face()
        with BuildLine():
            Line((-7.4696317165, 3.0940227629), (0, 0))
            Line((0, 0), (-5.7170086075, 5.7170086075))
            ThreePointArc((-5.7170086075, 5.7170086075), (-6.7224909404, 4.49182484), (-7.4696317165, 3.0940227629))
        make_face()
        with BuildLine():
            Line((-5.7170086075, 5.7170086075), (0, 0))
            Line((0, 0), (-3.0940227629, 7.4696317165))
            ThreePointArc((-3.0940227629, 7.4696317165), (-4.49182484, 6.7224909404), (-5.7170086075, 5.7170086075))
        make_face()
        with BuildLine():
            ThreePointArc((3.0940227629, 7.4696317165), (4.49182484, 6.7224909404), (5.7170086075, 5.7170086075))
            Line((5.7170086075, 5.7170086075), (10.2071366681, 10.2071366681))
            Line((10.2071366681, 10.2071366681), (3.0940227629, 7.4696317165))
        make_face()
        with BuildLine():
            Line((10.2071366681, -10.2071366681), (5.7170086075, -5.7170086075))
            ThreePointArc((5.7170086075, -5.7170086075), (4.49182484, -6.7224909404), (3.0940227629, -7.4696317165))
            Line((3.0940227629, -7.4696317165), (10.2071366681, -10.2071366681))
        make_face()
        with BuildLine():
            ThreePointArc((0, 8.085071109), (1.5773191262, 7.9297187347), (3.0940227629, 7.4696317165))
            Line((3.0940227629, 7.4696317165), (0, 14.435071109))
            Line((0, 14.435071109), (0, 8.085071109))
        make_face()
        with BuildLine():
            Line((0, -14.435071109), (3.0940227629, -7.4696317165))
            ThreePointArc((3.0940227629, -7.4696317165), (1.5773191262, -7.9297187347), (0, -8.085071109))
            Line((0, -8.085071109), (0, -14.435071109))
        make_face()
        with BuildLine():
            Line((-10.2071366681, -10.2071366681), (-3.0940227629, -7.4696317165))
            ThreePointArc((-3.0940227629, -7.4696317165), (-4.49182484, -6.7224909404), (-5.7170086075, -5.7170086075))
            Line((-5.7170086075, -5.7170086075), (-10.2071366681, -10.2071366681))
        make_face()
        with BuildLine():
            ThreePointArc((0, -8.085071109), (-1.5773191262, -7.9297187347), (-3.0940227629, -7.4696317165))
            Line((-3.0940227629, -7.4696317165), (0, -14.435071109))
            Line((0, -14.435071109), (0, -8.085071109))
        make_face()
        with BuildLine():
            Line((-10.2071366681, -10.2071366681), (-5.7170086075, -5.7170086075))
            ThreePointArc((-5.7170086075, -5.7170086075), (-6.7224909404, -4.49182484), (-7.4696317165, -3.0940227629))
            Line((-7.4696317165, -3.0940227629), (-10.2071366681, -10.2071366681))
        make_face()
        with BuildLine():
            Line((-14.435071109, 0), (-7.4696317165, -3.0940227629))
            ThreePointArc((-7.4696317165, -3.0940227629), (-7.9297187347, -1.5773191262), (-8.085071109, 0))
            Line((-8.085071109, 0), (-14.435071109, 0))
        make_face()
        with BuildLine():
            Line((-10.2071366681, 10.2071366681), (-7.4696317165, 3.0940227629))
            ThreePointArc((-7.4696317165, 3.0940227629), (-6.7224909404, 4.49182484), (-5.7170086075, 5.7170086075))
            Line((-5.7170086075, 5.7170086075), (-10.2071366681, 10.2071366681))
        make_face()
        with BuildLine():
            ThreePointArc((-8.085071109, 0), (-7.9297187347, 1.5773191262), (-7.4696317165, 3.0940227629))
            Line((-7.4696317165, 3.0940227629), (-14.435071109, 0))
            Line((-14.435071109, 0), (-8.085071109, 0))
        make_face()
        with BuildLine():
            Line((-10.2071366681, 10.2071366681), (-5.7170086075, 5.7170086075))
            ThreePointArc((-5.7170086075, 5.7170086075), (-4.49182484, 6.7224909404), (-3.0940227629, 7.4696317165))
            Line((-3.0940227629, 7.4696317165), (-10.2071366681, 10.2071366681))
        make_face()
        with BuildLine():
            Line((0, 14.435071109), (-3.0940227629, 7.4696317165))
            ThreePointArc((-3.0940227629, 7.4696317165), (-1.5773191262, 7.9297187347), (0, 8.085071109))
            Line((0, 8.085071109), (0, 14.435071109))
        make_face()
    extrude(amount=F6_DEPTH)

    # F5 (on Front) → F7 (cut, symmetric)
    with BuildSketch(Plane.XZ):
        Circle(F5_R)
    extrude(amount=-F7_DEPTH, both=True, mode=Mode.SUBTRACT)


solid = f1.part
